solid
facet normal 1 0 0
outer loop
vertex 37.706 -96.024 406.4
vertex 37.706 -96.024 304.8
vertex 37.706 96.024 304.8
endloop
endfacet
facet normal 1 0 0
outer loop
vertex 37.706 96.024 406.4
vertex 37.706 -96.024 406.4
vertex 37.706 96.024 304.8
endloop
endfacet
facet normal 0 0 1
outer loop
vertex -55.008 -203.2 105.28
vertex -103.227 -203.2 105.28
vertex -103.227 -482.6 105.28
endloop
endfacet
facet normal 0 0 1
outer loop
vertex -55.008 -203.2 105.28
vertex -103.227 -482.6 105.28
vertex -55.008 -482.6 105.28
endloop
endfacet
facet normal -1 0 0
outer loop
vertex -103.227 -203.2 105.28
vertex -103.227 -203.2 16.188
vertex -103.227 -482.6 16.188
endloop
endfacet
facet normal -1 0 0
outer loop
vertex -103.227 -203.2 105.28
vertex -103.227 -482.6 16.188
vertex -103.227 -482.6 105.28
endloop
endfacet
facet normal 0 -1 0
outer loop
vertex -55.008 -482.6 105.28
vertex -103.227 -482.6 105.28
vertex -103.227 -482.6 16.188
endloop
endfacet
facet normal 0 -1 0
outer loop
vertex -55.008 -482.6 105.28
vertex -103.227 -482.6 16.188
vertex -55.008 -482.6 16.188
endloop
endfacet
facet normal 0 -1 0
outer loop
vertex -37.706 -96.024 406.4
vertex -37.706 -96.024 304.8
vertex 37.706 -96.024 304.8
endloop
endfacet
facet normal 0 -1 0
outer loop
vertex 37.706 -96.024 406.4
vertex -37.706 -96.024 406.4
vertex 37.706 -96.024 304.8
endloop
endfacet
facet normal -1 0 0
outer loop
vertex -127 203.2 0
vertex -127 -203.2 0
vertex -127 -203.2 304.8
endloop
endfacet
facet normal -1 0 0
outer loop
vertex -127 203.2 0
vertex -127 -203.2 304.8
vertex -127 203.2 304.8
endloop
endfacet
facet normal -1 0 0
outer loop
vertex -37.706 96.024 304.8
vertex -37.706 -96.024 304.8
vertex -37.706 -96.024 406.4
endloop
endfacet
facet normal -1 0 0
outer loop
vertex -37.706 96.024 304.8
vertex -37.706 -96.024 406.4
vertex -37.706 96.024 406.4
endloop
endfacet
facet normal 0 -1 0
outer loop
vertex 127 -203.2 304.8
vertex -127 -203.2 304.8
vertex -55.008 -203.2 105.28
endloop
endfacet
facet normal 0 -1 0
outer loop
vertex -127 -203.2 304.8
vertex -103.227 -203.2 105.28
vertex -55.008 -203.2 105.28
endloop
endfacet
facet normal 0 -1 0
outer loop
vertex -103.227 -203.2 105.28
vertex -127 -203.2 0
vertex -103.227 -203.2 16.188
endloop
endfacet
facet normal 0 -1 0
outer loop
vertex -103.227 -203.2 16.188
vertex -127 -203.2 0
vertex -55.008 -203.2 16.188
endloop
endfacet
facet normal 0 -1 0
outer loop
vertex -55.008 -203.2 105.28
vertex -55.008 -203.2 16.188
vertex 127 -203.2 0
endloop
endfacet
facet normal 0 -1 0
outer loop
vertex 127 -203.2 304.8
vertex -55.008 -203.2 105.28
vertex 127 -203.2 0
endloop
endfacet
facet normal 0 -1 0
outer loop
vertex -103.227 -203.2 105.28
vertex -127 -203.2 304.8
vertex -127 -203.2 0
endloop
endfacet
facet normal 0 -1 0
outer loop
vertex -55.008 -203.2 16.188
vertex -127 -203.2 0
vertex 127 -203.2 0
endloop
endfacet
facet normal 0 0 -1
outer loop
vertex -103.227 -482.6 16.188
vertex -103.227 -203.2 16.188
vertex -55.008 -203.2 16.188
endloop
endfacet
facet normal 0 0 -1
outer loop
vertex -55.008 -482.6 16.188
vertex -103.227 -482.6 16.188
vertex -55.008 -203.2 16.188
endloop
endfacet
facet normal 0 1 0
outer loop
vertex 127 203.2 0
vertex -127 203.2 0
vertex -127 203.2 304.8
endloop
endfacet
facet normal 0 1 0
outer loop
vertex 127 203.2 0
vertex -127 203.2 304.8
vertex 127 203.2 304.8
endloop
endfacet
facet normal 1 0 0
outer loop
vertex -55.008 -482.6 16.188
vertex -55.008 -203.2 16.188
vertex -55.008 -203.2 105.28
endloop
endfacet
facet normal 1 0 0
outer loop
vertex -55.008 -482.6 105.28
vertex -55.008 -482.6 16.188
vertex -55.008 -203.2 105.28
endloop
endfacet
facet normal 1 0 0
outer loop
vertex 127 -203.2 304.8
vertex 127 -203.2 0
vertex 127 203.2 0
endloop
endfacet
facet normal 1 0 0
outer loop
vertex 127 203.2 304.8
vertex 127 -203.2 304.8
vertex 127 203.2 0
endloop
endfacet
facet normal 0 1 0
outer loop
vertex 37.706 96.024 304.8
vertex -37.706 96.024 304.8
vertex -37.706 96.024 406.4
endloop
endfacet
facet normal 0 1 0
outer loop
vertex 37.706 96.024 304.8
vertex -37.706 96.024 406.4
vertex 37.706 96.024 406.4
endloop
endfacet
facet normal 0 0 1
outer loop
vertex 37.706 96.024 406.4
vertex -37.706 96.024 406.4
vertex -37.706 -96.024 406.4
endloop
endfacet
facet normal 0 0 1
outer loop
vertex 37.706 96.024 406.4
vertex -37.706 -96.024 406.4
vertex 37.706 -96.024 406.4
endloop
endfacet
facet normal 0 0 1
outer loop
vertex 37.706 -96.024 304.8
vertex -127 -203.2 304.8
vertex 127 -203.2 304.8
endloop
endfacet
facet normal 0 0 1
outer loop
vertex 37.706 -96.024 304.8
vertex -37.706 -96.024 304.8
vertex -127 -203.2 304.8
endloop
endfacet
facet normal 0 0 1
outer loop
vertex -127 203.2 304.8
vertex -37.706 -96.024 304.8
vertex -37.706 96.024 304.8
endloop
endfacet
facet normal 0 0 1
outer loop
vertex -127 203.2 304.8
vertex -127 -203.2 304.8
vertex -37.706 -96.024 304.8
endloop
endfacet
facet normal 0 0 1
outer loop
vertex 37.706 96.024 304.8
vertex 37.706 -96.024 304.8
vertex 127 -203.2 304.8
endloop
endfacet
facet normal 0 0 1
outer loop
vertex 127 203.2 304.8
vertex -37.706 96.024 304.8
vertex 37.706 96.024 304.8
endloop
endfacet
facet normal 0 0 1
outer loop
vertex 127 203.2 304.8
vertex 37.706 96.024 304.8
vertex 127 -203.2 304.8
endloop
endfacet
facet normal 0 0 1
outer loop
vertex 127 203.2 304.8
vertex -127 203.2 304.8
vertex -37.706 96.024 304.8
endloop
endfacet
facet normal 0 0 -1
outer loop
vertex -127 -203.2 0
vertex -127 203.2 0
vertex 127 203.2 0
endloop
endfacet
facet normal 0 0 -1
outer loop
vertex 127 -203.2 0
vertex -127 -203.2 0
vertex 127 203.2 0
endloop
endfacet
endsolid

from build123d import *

# Parameters (mm, degrees)
F0_W     = 254
F0_H     = 406.4
F1_DEPTH = 304.8
F2_W     = 48.218414
F2_H     = 89.092545
F3_DEPTH = 279.4
F4_W     = 75.411438
F4_H     = 192.048072
F5_DEPTH = 101.6


with BuildPart() as f1:
    # F0 (on Top) → F1 (new body)
    with BuildSketch(Plane.XY):
        Rectangle(F0_W, F0_H)
    extrude(amount=F1_DEPTH)

    # F2 (on face) → F3 (join)
    with BuildSketch(Plane.XZ.offset(203.2)):
        with Locations((-79.117574, 60.734126)):
            Rectangle(F2_W, F2_H)
    extrude(amount=F3_DEPTH)

    # F4 (on face) → F5 (join)
    with BuildSketch(Plane.XY.offset(304.8)):
        Rectangle(F4_W, F4_H)
    extrude(amount=F5_DEPTH)


solid = f1.part
